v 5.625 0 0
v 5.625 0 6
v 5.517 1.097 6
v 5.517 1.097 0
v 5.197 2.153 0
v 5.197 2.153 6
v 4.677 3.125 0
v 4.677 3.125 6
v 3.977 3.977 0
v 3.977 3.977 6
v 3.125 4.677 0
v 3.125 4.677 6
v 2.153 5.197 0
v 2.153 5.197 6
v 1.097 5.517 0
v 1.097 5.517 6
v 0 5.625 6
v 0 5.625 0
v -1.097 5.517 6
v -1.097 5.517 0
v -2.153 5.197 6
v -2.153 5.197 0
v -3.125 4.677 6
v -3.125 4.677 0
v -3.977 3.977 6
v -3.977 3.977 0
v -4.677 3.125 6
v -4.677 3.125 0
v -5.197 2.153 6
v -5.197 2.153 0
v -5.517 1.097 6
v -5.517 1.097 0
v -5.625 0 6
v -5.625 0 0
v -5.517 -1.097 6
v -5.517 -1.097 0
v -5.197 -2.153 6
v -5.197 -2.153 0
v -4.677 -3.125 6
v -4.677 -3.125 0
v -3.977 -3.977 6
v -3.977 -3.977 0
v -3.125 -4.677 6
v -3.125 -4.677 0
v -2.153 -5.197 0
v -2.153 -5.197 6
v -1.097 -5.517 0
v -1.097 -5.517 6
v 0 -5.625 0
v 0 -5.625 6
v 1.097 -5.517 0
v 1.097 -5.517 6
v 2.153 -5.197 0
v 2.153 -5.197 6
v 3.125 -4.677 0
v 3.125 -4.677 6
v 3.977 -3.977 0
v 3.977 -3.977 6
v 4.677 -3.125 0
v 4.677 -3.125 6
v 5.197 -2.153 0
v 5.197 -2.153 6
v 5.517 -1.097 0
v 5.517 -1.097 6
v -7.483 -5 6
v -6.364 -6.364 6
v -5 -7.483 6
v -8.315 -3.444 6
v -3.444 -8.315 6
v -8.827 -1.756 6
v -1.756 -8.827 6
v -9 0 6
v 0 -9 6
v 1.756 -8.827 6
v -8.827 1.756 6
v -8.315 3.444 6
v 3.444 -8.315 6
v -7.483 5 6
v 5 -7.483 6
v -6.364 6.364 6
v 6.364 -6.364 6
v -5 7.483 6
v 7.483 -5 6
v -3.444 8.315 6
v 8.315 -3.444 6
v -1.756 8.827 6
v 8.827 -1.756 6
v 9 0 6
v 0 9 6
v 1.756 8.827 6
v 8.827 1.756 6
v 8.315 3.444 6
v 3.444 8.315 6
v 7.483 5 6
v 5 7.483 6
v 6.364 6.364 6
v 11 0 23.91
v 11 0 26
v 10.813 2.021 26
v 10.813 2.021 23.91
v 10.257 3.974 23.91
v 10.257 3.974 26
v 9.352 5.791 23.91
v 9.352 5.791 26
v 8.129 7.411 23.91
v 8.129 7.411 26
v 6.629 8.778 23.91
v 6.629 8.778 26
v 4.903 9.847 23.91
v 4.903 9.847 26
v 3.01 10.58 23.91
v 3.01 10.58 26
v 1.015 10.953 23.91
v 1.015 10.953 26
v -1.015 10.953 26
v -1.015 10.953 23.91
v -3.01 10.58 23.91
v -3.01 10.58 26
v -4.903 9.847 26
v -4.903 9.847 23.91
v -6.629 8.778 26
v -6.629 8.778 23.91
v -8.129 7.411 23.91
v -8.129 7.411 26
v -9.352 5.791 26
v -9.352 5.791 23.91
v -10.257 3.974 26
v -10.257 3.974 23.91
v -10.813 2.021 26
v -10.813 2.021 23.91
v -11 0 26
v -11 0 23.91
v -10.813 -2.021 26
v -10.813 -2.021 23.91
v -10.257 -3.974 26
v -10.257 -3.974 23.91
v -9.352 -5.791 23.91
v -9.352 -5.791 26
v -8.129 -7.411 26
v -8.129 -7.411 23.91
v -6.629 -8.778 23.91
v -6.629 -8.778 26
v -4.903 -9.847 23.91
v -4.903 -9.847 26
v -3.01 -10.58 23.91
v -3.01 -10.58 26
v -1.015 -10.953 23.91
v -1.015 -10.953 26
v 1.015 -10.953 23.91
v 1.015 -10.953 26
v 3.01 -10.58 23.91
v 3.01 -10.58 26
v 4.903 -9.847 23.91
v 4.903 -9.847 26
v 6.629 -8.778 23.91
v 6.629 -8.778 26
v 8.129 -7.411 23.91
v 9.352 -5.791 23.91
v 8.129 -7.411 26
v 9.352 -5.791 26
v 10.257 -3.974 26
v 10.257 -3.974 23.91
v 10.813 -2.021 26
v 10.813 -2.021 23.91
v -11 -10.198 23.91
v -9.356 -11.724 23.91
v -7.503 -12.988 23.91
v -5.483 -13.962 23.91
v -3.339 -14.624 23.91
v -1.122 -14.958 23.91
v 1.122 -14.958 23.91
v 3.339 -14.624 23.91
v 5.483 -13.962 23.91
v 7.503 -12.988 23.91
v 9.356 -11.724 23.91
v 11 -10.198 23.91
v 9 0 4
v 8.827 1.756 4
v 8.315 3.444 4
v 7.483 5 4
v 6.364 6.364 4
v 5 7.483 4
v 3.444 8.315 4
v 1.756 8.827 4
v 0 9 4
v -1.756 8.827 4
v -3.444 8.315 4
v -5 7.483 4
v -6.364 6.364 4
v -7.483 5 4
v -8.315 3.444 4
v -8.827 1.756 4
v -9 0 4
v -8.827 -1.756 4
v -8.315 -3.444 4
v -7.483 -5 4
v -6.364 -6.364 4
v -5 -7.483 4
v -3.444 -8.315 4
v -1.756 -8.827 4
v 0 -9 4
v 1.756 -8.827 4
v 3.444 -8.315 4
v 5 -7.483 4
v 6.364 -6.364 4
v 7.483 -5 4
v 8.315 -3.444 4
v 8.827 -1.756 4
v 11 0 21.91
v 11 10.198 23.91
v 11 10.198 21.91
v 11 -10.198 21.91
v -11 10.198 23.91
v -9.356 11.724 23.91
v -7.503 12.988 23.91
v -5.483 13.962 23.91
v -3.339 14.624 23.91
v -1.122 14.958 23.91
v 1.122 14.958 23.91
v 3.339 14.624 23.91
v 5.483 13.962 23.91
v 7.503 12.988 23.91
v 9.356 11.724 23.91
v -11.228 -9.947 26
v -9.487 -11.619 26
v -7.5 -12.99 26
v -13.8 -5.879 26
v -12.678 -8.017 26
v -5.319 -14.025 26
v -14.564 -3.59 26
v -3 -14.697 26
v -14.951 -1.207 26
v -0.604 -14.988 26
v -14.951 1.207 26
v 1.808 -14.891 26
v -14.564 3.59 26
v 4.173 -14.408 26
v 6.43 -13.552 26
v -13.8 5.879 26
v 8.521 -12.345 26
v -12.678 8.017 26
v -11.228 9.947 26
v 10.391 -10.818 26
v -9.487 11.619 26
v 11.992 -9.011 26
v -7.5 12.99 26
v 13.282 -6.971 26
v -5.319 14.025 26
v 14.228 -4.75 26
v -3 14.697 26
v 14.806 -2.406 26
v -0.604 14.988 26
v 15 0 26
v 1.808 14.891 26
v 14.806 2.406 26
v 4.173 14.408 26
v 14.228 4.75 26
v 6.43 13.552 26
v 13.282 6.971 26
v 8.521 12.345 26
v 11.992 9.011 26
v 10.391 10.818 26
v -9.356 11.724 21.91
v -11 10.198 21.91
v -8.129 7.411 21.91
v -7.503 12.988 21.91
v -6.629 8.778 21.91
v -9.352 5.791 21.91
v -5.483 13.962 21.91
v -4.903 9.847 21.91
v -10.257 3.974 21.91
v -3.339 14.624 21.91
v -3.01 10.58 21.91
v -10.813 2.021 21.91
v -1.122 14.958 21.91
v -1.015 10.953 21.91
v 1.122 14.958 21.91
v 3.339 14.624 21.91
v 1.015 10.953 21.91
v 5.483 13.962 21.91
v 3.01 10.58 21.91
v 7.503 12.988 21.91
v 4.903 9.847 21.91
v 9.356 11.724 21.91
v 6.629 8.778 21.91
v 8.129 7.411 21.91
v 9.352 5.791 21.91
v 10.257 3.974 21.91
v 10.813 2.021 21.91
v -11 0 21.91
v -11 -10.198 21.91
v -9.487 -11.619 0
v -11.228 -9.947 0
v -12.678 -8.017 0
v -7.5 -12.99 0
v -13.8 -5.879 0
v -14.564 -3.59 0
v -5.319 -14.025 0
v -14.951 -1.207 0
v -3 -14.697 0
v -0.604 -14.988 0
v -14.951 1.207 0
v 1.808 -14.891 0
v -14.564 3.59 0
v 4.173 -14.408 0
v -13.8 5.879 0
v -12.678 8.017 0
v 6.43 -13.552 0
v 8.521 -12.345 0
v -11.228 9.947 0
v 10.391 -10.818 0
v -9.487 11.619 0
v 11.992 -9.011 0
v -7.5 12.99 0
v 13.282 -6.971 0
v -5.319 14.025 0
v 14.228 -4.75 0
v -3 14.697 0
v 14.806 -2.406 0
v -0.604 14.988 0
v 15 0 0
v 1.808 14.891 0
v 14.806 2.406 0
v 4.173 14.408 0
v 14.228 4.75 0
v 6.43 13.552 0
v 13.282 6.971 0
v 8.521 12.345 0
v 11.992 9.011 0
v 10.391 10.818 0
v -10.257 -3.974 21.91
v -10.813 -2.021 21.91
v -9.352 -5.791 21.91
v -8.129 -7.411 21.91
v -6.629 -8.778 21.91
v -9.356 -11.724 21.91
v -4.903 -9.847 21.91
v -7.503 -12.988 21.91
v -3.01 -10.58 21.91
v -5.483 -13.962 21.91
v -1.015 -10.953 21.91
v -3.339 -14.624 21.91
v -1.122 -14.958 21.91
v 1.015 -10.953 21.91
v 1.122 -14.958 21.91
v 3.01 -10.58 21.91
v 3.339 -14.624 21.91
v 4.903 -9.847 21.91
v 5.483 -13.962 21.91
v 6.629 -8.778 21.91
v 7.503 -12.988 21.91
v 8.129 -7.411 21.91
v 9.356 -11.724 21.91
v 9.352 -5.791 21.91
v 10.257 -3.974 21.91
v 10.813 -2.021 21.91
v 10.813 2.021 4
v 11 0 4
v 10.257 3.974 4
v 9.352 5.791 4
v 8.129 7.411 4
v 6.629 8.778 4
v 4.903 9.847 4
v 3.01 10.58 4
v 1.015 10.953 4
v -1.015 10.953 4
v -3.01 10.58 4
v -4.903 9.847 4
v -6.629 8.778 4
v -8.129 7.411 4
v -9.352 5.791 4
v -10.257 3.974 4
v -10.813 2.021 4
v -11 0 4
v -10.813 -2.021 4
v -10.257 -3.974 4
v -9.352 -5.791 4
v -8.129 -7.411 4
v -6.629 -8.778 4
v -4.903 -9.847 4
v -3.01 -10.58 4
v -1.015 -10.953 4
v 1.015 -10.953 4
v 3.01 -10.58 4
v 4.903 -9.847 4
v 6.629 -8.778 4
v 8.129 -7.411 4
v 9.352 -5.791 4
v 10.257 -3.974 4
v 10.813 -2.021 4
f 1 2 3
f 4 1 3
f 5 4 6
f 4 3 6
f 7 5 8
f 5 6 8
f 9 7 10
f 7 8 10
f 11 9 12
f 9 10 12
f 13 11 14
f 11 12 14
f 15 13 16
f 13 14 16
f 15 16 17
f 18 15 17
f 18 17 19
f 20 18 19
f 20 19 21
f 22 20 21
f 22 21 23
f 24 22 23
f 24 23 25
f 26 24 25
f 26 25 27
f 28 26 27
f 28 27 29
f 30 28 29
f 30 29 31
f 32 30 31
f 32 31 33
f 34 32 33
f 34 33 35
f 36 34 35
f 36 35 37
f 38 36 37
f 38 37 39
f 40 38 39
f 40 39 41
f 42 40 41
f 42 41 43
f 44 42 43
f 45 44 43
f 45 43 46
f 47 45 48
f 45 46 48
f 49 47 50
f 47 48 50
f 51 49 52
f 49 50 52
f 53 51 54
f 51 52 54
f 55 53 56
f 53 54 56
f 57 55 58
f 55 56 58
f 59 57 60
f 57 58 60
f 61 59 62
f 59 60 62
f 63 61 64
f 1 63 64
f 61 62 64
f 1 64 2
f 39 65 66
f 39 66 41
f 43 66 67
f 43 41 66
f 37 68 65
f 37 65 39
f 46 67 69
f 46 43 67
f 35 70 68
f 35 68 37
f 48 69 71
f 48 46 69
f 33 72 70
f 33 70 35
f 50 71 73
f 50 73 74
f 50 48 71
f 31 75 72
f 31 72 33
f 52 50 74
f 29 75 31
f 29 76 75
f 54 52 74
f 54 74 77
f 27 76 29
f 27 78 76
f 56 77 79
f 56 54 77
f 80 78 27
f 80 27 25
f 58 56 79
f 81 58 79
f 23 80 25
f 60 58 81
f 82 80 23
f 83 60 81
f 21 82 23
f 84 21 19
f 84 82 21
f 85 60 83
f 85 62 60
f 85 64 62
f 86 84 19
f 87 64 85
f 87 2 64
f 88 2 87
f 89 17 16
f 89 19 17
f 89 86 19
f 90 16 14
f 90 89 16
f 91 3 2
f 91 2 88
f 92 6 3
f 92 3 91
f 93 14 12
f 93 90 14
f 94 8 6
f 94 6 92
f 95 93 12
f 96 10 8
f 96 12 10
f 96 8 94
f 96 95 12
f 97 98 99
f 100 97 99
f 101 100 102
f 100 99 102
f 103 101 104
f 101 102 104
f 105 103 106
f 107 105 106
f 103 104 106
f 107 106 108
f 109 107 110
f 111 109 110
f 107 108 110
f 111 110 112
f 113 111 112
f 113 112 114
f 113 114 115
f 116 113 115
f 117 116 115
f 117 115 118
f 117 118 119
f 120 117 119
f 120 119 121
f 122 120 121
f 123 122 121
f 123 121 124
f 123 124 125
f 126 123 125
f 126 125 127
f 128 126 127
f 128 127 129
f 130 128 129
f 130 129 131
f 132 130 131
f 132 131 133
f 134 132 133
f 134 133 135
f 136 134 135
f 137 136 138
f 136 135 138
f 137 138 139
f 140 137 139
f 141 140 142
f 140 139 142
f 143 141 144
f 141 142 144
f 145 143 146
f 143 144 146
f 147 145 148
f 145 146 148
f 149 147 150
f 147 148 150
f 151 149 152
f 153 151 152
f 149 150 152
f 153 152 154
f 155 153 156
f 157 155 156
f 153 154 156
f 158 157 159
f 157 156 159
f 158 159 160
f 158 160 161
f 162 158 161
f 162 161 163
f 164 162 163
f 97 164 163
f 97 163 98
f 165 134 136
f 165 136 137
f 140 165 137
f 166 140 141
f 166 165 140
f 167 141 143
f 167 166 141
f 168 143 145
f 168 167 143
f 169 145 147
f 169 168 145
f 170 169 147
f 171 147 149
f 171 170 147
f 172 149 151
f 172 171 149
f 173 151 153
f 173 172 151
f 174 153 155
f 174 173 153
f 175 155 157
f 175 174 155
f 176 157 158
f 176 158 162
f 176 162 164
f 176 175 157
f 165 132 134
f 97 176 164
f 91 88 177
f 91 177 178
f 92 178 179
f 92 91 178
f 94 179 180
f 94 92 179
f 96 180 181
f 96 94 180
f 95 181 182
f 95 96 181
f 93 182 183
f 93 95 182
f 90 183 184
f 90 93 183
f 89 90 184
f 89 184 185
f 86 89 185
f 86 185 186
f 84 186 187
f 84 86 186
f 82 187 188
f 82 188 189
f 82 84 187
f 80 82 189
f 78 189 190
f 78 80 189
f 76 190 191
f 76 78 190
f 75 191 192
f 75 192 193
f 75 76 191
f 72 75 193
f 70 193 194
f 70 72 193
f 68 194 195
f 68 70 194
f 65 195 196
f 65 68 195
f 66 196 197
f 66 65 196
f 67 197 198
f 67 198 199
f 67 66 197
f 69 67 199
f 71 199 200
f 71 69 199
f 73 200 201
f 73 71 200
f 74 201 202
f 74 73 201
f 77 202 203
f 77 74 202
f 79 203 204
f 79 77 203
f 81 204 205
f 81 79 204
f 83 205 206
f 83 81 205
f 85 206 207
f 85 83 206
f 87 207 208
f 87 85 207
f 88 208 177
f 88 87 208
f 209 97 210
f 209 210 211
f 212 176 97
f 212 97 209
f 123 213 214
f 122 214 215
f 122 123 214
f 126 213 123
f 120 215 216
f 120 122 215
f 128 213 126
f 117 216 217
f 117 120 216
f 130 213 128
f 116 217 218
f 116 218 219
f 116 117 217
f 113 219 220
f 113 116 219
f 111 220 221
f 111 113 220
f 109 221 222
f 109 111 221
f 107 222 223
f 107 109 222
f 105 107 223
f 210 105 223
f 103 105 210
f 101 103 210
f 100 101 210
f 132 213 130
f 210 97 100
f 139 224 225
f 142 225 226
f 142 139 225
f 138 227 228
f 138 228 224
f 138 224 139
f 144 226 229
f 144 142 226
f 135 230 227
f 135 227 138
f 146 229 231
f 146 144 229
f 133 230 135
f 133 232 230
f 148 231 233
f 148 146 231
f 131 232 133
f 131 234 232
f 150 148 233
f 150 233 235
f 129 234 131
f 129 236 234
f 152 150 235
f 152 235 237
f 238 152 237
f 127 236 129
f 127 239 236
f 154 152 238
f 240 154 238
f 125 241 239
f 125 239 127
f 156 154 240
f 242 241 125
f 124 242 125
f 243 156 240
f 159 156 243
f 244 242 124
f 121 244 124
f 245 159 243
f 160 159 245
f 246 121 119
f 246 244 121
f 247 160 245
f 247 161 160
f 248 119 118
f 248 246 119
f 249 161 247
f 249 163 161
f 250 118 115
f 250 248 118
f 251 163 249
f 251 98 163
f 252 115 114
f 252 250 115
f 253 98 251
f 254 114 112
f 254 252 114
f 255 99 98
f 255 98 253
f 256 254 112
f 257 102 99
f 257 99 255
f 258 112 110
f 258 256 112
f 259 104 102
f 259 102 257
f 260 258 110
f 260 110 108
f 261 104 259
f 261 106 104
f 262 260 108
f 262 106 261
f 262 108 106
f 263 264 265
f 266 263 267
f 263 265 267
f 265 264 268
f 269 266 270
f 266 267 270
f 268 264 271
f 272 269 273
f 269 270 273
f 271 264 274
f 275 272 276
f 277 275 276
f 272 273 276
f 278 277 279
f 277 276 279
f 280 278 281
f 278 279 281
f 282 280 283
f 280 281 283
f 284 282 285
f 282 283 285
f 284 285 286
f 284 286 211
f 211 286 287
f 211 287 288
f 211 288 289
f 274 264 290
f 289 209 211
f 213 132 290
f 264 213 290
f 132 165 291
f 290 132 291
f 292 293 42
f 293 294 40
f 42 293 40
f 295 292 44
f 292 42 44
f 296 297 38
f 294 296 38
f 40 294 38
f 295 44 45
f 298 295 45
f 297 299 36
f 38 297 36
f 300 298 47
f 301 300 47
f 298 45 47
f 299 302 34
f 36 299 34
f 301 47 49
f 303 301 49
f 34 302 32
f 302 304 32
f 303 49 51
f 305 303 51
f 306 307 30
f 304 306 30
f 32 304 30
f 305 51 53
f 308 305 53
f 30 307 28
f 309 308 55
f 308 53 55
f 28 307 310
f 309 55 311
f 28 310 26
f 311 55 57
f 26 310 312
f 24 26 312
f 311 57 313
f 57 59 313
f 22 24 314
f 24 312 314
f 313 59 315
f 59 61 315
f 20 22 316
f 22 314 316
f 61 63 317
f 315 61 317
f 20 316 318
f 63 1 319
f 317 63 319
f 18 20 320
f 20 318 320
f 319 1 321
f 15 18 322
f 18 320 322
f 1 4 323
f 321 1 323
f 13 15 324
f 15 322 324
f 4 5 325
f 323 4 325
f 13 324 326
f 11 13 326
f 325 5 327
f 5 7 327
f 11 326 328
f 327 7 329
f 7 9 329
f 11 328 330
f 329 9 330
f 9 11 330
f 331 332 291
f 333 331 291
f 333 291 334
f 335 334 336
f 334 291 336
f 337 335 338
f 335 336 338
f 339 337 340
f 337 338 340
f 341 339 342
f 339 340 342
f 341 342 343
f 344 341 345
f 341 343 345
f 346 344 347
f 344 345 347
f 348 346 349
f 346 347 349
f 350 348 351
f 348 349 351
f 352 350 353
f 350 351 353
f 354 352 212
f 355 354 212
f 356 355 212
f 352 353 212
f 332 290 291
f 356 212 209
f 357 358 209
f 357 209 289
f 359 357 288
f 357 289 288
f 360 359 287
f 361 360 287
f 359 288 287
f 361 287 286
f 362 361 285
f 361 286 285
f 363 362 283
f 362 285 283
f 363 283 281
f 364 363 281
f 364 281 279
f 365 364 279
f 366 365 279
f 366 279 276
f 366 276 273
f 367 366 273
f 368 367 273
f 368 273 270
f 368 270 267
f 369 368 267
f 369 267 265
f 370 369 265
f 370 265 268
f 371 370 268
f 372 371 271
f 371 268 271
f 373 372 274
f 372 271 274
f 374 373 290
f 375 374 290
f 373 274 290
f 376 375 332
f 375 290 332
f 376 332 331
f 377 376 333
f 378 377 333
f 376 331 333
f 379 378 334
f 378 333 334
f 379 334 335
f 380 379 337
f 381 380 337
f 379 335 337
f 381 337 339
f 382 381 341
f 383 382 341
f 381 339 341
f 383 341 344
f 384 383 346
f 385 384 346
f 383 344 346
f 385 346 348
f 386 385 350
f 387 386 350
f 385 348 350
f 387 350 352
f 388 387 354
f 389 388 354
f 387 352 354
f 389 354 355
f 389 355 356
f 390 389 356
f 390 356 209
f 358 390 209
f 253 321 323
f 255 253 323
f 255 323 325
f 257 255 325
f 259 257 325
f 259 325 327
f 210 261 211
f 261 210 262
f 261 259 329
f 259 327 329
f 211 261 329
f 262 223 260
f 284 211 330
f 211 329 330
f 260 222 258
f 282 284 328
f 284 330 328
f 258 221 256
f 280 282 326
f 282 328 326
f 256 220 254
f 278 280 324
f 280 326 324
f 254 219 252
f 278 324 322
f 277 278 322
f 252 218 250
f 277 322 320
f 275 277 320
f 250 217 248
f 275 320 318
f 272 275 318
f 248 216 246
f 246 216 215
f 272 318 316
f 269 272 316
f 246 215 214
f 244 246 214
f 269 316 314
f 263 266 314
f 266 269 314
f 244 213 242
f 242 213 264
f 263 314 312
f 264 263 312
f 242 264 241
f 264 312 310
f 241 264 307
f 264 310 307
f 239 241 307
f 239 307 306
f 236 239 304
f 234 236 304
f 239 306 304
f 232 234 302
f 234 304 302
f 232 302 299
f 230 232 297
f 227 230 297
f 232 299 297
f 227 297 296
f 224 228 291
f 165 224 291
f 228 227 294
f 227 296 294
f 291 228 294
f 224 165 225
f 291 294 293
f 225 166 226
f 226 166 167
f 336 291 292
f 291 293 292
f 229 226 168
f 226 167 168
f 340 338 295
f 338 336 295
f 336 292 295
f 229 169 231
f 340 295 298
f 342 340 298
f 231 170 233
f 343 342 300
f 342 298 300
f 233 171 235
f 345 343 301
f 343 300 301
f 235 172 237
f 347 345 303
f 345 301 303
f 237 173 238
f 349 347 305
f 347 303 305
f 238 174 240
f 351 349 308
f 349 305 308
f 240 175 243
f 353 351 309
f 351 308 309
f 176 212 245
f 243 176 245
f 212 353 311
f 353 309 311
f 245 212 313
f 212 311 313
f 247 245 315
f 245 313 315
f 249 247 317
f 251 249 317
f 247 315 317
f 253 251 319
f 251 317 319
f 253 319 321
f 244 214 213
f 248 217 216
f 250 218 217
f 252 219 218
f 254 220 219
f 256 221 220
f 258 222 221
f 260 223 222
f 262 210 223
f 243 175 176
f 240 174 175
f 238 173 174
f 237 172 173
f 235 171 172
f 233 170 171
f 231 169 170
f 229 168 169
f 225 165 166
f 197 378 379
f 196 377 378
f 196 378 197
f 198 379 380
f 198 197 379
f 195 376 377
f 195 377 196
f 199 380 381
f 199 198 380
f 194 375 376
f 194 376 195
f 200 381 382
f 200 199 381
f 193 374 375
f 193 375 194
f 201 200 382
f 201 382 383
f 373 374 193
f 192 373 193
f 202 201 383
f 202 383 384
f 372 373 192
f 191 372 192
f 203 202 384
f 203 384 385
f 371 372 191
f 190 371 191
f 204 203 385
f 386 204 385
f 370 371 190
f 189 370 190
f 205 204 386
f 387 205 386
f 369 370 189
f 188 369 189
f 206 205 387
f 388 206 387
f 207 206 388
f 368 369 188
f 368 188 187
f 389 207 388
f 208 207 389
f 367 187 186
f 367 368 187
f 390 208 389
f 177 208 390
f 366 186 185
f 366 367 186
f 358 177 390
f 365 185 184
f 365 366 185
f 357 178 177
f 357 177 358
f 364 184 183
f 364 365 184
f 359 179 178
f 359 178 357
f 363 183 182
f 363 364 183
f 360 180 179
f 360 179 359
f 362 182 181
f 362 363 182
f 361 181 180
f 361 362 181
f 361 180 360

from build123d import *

# Parameters (mm, degrees)
SKETCH1_R               = 15
BOSS_EXTRUDE5_DEPTH     = 26
SKETCH3_R               = 5.625
CUT_EXTRUDE2_DEPTH      = 34.555923471
SKETCH4_R               = 11
CUT_EXTRUDE3_DEPTH      = 20
CUT_EXTRUDE4_DEPTH      = 34.555923471
CUT_EXTRUDE4_DEPTH_BACK = 34.555923471
SKETCH6_W               = 22
SKETCH6_H               = 2
CUT_EXTRUDE6_START      = 6
SKETCH7_R               = 11
SKETCH7_R_2             = 9
CUT_EXTRUDE6_DEPTH      = 2


with BuildPart() as part:
    # Sketch1 → Boss-Extrude5 (new body)
    with BuildSketch(Plane.XY):
        Circle(SKETCH1_R)
    extrude(amount=BOSS_EXTRUDE5_DEPTH)

    # Sketch3 → Cut-Extrude2 (cut, through all)
    with BuildSketch(Plane.XY.offset(26)):
        Circle(SKETCH3_R)
    extrude(amount=-CUT_EXTRUDE2_DEPTH, mode=Mode.SUBTRACT)

    # Sketch4 → Cut-Extrude3 (cut)
    with BuildSketch(Plane.XY.offset(26)):
        Circle(SKETCH4_R)
    extrude(amount=-CUT_EXTRUDE3_DEPTH, mode=Mode.SUBTRACT)

    # Sketch6 → Cut-Extrude4 (cut, two sides: drawn at the far end of the back side and taken through both)
    with BuildSketch(Plane(origin=(0, 0, 0), x_dir=(1, 0, 0), z_dir=(0, 1, 0)).offset(-CUT_EXTRUDE4_DEPTH_BACK)):
        with Locations((0, -22.90958557)):
            Rectangle(SKETCH6_W, SKETCH6_H)
    extrude(amount=CUT_EXTRUDE4_DEPTH + CUT_EXTRUDE4_DEPTH_BACK, mode=Mode.SUBTRACT)

    # Sketch7 → Cut-Extrude6 (cut)
    with BuildSketch(Plane.XY.offset(CUT_EXTRUDE6_START)):
        Circle(SKETCH7_R)
        Circle(SKETCH7_R_2, mode=Mode.SUBTRACT)
    extrude(amount=-CUT_EXTRUDE6_DEPTH, mode=Mode.SUBTRACT)


solid = part.part
